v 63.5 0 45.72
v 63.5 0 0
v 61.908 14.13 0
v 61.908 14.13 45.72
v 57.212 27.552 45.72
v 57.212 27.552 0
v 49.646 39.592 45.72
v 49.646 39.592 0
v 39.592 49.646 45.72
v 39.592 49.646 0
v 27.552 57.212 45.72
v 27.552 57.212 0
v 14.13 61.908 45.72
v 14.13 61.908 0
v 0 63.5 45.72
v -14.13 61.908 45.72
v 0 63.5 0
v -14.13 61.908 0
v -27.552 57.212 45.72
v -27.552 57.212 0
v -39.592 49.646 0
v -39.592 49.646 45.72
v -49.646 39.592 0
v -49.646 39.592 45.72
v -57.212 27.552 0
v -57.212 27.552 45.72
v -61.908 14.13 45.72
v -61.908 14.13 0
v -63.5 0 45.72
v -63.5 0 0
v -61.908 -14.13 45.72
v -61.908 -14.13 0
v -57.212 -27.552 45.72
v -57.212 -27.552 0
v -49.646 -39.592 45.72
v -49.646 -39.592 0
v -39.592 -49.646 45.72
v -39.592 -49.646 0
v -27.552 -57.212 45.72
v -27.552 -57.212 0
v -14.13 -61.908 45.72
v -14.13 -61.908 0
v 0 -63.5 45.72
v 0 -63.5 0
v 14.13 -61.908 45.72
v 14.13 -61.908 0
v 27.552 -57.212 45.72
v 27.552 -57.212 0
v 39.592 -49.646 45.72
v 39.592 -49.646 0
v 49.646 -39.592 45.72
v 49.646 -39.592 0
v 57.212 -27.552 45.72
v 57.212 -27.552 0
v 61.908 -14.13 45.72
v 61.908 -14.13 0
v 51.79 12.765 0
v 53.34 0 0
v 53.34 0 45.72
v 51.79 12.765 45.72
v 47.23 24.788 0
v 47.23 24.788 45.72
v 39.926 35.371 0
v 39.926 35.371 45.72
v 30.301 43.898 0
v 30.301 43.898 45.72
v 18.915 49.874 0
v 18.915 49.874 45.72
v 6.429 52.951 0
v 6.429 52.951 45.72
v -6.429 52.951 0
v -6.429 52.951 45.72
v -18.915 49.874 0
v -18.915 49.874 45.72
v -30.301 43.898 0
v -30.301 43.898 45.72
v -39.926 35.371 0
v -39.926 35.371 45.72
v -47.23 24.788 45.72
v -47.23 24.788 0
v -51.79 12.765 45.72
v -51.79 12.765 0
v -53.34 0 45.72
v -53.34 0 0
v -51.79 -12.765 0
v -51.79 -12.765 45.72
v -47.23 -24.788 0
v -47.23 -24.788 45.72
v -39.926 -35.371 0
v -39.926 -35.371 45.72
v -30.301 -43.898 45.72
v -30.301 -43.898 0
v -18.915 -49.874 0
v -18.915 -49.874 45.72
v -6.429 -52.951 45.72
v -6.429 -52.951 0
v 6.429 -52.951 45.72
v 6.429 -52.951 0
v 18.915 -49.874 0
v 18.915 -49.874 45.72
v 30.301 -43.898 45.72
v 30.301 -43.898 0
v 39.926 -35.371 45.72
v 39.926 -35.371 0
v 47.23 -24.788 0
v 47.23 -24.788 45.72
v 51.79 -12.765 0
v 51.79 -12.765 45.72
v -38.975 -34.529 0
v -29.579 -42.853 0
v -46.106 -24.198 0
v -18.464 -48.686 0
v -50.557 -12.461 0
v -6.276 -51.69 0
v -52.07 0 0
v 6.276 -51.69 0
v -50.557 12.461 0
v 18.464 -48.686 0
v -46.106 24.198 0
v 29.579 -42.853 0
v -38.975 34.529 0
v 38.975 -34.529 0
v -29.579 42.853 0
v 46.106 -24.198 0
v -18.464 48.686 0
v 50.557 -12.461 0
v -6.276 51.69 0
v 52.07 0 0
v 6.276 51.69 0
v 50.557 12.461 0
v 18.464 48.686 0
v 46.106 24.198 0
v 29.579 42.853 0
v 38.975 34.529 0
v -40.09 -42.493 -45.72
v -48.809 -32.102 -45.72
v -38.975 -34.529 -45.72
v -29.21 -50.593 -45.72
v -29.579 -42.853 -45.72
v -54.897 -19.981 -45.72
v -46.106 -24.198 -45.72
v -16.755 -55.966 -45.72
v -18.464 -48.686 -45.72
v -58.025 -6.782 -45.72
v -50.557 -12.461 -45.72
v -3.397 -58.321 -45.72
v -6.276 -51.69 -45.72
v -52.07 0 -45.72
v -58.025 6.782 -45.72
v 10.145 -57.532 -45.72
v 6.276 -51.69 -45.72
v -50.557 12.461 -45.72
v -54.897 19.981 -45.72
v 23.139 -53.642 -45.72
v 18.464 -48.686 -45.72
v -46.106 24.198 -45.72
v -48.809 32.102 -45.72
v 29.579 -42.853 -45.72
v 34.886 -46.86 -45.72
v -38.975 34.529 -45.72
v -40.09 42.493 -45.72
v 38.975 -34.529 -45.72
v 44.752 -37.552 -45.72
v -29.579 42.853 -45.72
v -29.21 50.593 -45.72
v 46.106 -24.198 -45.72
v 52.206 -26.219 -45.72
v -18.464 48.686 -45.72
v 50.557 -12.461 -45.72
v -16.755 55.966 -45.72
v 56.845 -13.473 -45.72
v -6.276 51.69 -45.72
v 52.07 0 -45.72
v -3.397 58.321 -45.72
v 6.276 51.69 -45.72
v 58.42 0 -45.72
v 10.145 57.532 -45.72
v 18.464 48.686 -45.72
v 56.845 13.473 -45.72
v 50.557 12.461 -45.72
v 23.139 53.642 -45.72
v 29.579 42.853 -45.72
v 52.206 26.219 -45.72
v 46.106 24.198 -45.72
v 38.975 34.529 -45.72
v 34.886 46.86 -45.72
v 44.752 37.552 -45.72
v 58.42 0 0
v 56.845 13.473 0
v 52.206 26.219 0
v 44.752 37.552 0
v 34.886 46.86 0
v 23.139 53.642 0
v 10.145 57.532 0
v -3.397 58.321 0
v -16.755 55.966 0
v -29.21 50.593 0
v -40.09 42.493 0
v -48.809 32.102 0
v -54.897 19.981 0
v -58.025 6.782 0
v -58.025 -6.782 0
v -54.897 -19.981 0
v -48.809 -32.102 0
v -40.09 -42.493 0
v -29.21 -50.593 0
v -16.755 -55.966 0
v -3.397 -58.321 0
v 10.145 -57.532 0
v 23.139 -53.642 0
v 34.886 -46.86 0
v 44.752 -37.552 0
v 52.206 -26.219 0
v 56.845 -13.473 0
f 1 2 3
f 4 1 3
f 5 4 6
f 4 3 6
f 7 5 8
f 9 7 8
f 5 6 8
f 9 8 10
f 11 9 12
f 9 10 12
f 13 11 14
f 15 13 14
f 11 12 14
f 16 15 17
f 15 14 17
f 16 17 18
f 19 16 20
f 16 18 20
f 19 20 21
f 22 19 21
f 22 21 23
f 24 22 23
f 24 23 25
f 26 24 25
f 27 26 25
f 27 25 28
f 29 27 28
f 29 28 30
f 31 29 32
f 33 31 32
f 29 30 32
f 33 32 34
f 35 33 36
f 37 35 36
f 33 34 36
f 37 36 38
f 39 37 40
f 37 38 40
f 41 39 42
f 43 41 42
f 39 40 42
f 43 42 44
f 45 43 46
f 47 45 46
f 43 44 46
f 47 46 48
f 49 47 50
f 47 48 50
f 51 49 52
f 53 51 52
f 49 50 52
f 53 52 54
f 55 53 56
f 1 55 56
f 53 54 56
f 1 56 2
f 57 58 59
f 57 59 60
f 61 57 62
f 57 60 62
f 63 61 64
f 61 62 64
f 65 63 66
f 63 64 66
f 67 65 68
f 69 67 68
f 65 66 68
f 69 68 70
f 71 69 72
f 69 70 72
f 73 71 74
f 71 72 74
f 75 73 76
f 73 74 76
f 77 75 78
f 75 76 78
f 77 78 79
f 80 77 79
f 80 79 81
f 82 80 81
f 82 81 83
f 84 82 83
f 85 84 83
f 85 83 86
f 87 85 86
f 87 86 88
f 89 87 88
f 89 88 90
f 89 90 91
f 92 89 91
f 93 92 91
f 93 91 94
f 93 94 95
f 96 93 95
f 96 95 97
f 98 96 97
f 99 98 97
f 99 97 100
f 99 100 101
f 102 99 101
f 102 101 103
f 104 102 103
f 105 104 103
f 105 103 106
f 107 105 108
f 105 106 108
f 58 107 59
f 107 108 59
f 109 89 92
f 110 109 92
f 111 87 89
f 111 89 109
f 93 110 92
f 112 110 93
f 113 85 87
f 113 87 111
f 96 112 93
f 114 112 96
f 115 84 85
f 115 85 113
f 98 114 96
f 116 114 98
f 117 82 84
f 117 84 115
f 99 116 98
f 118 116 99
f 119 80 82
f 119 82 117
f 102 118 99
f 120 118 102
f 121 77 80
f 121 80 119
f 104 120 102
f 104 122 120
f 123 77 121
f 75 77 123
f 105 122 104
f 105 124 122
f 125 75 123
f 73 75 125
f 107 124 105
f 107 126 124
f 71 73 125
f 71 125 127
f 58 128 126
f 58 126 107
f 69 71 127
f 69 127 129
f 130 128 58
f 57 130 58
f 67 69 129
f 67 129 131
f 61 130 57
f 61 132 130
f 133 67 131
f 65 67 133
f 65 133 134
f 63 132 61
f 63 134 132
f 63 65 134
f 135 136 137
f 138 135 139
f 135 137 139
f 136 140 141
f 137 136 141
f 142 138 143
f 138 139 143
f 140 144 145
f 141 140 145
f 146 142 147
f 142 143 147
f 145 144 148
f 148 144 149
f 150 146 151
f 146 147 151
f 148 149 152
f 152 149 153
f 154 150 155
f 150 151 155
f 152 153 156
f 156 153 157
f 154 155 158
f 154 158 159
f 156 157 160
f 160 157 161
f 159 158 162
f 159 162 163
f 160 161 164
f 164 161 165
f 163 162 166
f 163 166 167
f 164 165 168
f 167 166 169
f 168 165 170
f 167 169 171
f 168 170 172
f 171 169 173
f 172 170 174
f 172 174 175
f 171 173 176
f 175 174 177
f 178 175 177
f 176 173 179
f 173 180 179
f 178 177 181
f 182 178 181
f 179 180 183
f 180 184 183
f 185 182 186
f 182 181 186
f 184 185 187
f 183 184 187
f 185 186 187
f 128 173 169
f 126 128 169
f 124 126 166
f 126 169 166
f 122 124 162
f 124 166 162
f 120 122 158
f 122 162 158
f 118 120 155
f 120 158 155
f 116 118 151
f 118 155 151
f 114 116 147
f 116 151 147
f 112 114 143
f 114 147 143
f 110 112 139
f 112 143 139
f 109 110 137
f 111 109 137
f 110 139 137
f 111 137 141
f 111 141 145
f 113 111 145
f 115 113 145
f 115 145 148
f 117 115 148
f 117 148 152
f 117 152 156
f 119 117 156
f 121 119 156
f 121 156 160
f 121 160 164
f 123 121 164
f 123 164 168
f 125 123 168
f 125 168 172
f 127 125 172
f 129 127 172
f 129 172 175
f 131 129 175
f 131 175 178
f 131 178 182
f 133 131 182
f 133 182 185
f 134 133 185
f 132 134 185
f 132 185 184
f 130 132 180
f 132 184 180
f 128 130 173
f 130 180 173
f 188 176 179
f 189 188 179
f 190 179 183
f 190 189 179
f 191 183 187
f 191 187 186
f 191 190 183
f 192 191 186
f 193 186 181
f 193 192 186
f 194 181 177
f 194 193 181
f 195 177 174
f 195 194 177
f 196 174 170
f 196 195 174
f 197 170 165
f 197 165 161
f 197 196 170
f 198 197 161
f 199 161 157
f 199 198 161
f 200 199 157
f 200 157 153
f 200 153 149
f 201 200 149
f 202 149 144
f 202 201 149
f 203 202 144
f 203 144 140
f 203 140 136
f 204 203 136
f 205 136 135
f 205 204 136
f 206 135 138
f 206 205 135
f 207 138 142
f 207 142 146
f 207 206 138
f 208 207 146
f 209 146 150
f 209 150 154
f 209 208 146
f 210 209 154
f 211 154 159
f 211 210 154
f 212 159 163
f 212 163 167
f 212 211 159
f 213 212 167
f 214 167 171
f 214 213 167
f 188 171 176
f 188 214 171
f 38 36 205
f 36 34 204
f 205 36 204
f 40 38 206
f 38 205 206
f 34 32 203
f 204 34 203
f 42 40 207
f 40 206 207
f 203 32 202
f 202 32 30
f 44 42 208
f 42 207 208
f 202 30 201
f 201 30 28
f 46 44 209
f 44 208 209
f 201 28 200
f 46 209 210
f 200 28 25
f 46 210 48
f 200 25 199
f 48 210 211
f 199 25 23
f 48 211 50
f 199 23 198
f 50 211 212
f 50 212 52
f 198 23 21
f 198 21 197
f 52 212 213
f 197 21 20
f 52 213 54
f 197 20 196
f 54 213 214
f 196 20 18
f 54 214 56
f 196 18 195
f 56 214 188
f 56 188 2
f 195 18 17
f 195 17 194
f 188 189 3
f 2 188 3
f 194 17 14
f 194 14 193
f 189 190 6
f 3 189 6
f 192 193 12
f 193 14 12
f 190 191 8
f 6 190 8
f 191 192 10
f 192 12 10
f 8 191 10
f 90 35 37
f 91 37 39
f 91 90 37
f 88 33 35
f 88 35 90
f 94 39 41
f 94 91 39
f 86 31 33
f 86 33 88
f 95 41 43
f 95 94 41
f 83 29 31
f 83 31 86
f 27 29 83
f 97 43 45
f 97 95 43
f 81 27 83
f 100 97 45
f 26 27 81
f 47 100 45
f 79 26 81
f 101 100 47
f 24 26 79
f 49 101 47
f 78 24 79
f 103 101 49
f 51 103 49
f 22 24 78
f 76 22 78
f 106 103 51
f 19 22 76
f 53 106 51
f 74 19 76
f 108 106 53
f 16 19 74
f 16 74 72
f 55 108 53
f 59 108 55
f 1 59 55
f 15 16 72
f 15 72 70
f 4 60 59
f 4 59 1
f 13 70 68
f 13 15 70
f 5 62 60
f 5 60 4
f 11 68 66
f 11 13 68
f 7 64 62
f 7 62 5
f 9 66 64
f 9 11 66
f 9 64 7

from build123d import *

# Parameters (mm, degrees)
F0_R     = 63.5
F1_DEPTH = 45.72
F2_R     = 53.34
F3_DEPTH = 50.8
F4_R     = 58.42
F5_DEPTH = 45.72
F6_R     = 52.07
F7_DEPTH = 127


with BuildPart() as f1:
    # F0 (on Top) → F1 (new body)
    with BuildSketch(Plane.XY):
        Circle(F0_R)
    extrude(amount=F1_DEPTH)

    # F2 (on face) → F3 (cut)
    with BuildSketch(Plane.XY.offset(45.72)):
        Circle(F2_R)
    extrude(amount=-F3_DEPTH, mode=Mode.SUBTRACT)

    # F4 (on Top) → F5 (join)
    with BuildSketch(Plane.XY):
        Circle(F4_R)
    extrude(amount=-F5_DEPTH)

    # F6 (on face) → F7 (cut)
    with BuildSketch(Plane(origin=(0, 0, -45.72), x_dir=(1, 0, 0), z_dir=(0, 0, -1))):
        Circle(F6_R)
    extrude(amount=-F7_DEPTH, mode=Mode.SUBTRACT)


solid = f1.part
